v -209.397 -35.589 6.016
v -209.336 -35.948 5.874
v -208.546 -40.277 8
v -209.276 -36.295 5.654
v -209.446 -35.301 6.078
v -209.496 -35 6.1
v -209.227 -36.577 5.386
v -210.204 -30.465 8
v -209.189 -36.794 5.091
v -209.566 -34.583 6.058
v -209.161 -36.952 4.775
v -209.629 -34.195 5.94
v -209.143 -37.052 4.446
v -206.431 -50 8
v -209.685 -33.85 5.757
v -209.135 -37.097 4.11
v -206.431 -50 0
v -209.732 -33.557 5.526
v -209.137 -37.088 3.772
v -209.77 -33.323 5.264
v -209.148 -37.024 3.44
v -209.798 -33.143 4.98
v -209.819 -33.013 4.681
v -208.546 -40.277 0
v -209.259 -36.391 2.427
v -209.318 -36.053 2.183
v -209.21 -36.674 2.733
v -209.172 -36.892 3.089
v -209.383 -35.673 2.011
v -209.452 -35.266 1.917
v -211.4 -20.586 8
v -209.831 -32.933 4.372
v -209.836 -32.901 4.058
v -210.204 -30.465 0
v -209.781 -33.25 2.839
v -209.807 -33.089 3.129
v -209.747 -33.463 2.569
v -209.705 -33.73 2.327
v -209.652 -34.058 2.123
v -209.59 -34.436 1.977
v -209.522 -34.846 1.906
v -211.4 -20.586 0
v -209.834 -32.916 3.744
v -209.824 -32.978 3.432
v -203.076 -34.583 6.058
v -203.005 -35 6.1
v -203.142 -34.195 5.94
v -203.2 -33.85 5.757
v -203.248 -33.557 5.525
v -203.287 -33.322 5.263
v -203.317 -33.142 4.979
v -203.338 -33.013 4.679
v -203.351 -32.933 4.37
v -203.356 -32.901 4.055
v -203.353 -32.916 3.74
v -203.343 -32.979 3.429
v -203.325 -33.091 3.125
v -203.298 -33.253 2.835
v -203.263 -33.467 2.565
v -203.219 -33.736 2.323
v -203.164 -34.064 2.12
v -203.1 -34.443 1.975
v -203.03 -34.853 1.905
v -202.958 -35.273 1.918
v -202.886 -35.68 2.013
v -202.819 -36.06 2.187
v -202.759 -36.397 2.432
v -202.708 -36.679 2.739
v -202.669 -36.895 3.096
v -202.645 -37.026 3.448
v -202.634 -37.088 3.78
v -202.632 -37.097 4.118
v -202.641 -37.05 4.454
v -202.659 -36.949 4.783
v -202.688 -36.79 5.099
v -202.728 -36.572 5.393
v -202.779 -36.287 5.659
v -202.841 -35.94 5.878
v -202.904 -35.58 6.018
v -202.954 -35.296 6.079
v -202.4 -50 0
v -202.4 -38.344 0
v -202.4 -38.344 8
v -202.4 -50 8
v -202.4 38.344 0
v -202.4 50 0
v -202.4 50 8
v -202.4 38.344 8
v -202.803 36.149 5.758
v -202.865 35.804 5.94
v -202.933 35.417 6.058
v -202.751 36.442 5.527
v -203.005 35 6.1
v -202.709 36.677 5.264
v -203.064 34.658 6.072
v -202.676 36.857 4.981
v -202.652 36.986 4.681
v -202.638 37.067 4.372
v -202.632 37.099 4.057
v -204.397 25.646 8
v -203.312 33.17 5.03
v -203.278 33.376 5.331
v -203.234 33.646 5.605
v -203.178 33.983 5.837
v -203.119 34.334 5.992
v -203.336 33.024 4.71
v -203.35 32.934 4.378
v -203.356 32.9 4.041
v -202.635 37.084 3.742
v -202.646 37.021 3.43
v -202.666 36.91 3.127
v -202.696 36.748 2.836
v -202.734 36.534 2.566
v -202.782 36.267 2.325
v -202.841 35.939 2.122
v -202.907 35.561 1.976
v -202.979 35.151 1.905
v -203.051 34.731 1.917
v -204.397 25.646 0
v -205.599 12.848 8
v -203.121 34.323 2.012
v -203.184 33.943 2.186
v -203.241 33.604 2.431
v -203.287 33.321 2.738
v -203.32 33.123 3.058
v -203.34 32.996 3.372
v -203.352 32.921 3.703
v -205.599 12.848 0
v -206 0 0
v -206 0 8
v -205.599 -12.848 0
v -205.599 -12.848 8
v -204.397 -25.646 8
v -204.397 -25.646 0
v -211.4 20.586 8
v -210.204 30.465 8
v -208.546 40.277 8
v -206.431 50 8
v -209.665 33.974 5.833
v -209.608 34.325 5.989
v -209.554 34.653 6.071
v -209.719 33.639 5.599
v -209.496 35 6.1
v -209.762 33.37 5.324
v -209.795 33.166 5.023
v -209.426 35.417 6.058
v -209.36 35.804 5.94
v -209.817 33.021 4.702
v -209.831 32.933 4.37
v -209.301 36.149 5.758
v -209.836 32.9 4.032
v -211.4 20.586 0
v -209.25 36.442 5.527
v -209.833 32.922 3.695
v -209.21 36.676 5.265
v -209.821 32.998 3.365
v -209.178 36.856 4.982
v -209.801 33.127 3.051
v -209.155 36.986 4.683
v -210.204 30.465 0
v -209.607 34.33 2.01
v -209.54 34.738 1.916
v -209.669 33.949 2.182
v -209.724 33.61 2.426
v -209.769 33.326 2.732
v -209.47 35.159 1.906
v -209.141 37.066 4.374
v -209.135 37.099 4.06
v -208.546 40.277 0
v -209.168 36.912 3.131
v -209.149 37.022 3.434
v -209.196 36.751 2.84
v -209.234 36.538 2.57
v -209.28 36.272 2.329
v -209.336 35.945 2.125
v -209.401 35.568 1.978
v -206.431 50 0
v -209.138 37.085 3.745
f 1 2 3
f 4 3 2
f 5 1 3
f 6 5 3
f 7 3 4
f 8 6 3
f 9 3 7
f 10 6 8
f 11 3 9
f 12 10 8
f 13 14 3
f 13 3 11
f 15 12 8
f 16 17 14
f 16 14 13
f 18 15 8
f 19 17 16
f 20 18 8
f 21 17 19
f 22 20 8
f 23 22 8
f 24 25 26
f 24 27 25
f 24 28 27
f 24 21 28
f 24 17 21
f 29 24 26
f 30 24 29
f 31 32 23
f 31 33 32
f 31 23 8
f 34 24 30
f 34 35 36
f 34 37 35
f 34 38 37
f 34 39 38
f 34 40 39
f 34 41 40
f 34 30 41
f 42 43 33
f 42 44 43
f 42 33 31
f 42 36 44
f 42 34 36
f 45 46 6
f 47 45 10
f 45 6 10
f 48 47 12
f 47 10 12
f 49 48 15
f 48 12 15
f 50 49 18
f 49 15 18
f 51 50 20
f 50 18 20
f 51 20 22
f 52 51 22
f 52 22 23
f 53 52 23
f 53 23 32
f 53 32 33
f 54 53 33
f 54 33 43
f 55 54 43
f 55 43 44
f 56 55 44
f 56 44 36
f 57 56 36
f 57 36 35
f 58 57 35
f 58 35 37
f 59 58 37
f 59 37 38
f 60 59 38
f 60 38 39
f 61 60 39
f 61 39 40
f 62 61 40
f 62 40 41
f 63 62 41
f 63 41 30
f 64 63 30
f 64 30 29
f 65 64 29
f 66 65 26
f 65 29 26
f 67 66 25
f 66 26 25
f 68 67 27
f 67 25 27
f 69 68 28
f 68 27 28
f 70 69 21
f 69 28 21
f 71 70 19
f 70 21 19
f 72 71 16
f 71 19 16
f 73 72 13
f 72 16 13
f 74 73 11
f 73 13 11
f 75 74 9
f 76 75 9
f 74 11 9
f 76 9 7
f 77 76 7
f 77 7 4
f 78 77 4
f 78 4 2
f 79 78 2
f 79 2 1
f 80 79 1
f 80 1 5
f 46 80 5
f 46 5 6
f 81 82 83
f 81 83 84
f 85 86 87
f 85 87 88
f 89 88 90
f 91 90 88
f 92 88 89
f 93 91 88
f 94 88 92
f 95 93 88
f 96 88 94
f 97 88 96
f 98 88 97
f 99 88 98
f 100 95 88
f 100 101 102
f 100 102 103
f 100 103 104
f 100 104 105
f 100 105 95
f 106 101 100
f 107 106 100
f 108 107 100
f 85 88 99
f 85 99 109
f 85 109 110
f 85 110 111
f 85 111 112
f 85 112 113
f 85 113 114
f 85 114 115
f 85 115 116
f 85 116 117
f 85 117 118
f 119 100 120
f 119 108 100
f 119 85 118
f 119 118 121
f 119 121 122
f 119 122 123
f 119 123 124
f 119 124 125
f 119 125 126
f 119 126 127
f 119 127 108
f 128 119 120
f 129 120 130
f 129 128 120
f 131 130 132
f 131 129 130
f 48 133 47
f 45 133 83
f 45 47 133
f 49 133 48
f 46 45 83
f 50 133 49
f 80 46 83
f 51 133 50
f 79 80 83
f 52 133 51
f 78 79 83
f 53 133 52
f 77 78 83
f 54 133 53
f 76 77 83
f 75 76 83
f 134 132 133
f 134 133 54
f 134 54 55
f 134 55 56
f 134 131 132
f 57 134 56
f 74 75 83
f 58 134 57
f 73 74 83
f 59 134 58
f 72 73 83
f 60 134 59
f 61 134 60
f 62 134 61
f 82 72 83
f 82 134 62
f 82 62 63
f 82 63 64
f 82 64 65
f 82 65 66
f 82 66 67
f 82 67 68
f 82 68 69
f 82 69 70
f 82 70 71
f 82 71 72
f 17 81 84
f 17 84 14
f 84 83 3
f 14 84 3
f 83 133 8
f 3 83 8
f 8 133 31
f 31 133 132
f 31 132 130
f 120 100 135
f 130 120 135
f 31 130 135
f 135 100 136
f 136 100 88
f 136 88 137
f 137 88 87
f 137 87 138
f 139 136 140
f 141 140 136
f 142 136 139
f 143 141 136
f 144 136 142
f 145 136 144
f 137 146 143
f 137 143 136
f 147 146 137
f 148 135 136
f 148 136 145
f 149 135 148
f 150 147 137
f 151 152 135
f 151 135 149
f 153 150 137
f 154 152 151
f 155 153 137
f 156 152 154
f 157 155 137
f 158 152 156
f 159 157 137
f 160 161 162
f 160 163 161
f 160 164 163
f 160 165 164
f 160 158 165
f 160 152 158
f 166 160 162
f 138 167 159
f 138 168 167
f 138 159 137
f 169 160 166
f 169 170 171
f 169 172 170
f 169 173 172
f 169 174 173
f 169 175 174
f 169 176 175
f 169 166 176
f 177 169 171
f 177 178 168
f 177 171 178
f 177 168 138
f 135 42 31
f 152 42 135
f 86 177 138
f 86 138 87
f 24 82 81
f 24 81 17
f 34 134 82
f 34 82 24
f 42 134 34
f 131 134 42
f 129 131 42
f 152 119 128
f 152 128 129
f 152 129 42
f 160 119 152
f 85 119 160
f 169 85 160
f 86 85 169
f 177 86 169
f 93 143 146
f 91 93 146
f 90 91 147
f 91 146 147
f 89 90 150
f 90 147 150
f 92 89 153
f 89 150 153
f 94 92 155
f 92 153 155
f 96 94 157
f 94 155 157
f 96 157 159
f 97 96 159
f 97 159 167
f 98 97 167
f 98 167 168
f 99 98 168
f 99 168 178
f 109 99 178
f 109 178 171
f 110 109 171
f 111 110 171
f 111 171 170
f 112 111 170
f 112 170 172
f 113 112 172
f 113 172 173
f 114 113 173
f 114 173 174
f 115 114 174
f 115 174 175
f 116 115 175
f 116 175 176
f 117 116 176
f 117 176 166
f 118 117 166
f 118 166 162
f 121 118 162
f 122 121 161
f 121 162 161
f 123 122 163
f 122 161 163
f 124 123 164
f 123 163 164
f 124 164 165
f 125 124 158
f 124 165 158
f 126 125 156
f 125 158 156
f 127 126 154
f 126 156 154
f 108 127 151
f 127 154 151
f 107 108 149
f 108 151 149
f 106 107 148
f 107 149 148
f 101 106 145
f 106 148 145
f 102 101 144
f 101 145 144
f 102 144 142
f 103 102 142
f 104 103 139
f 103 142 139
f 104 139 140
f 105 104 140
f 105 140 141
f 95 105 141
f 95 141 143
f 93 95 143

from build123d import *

# Parameters (mm, degrees)
BOSS_EXTRU_1_DEPTH      = 8
TROU_TARAUD_M51_D       = 4.2
TROU_TARAUD_M52_D       = 4.2
ESQUISSE8_W             = 18.974951104
ESQUISSE8_H             = 96.168502187
ENL_V_MAT_EXTRU_1_DEPTH = 34


with BuildPart() as part:
    # Esquisse1 → Boss.-Extru.1 (new body)
    with BuildSketch(Plane.XY):
        with BuildLine():
            Line((-202.4, -38.343708741), (-202.4, -50))
            Line((-202.4, -50), (-206.431005423, -50))
            ThreePointArc((-206.431005423, -50), (-212.4, 0), (-206.431005423, 50))
            Line((-206.431005423, 50), (-202.4, 50))
            Line((-202.4, 50), (-202.4, 38.343708741))
            ThreePointArc((-202.4, 38.343708741), (-206, 0), (-202.4, -38.343708741))
        make_face()
    extrude(amount=BOSS_EXTRU_1_DEPTH)

    # Trou taraudé M51 (through all)
    with Locations(Plane(origin=(-202.4, 0, 0), x_dir=(0, 0, -1), z_dir=(1, 0, 0))):
        with Locations((-4, 35)):
            Hole(TROU_TARAUD_M51_D / 2)

    # Trou taraudé M52 (through all)
    with Locations(Plane(origin=(-202.4, 0, 0), x_dir=(0, 0, -1), z_dir=(1, 0, 0))):
        with Locations((-4, -35)):
            Hole(TROU_TARAUD_M52_D / 2)

    # Esquisse8 → Enlèv. mat.-Extru.1 (cut)
    with BuildSketch(Plane.XY):
        with Locations((-220.887475552, -0.394191452)):
            Rectangle(ESQUISSE8_W, ESQUISSE8_H)
    extrude(amount=ENL_V_MAT_EXTRU_1_DEPTH, mode=Mode.SUBTRACT)


solid = part.part
